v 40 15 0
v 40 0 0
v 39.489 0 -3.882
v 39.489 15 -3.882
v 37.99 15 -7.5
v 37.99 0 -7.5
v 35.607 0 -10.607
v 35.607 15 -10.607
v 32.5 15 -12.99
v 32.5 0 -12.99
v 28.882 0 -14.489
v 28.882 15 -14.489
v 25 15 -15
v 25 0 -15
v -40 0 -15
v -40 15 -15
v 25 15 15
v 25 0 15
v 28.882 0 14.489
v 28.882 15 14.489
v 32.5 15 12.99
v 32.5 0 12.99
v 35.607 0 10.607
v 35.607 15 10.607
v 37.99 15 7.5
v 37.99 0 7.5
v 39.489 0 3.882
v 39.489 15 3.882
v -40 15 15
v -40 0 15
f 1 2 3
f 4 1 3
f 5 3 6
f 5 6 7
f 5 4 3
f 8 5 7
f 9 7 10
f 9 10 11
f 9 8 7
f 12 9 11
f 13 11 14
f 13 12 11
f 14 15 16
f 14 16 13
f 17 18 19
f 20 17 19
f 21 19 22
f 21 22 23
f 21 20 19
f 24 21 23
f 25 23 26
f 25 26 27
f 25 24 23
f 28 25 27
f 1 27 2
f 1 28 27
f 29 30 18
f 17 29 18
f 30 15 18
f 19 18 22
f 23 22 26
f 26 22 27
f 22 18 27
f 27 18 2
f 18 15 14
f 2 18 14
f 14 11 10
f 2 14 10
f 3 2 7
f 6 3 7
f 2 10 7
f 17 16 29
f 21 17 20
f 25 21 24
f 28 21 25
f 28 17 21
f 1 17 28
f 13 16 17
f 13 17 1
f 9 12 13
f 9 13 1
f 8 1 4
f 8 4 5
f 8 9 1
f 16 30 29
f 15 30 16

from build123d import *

# Parameters (mm, degrees)
SKETCH2_W           = 80
SKETCH2_H           = 30
BOSS_EXTRUDE1_DEPTH = 15
CUT_EXTRUDE4_DEPTH  = 16
CUT_EXTRUDE5_DEPTH  = 16


with BuildPart() as part:
    # Sketch2 → Boss-Extrude1 (new body)
    with BuildSketch(Plane(origin=(0, 0, 0), x_dir=(1, 0, 0), z_dir=(0, 1, 0))):
        Rectangle(SKETCH2_W, SKETCH2_H)
    extrude(amount=BOSS_EXTRUDE1_DEPTH)

    # Sketch4 → Cut-Extrude4 (cut, through all)
    with BuildSketch(Plane(origin=(0, 15, 0), x_dir=(1, 0, 0), z_dir=(0, 1, 0))):
        with BuildLine():
            Line((25, 15), (40, 15))
            Line((40, 15), (40, 0))
            ThreePointArc((40, 0), (35.606601718, 10.606601718), (25, 15))
        make_face()
    extrude(amount=-CUT_EXTRUDE4_DEPTH, mode=Mode.SUBTRACT)

    # Sketch5 → Cut-Extrude5 (cut, through all)
    with BuildSketch(Plane(origin=(0, 15, 0), x_dir=(1, 0, 0), z_dir=(0, 1, 0))):
        with BuildLine():
            Line((40, 0), (40, -15))
            Line((40, -15), (25, -15))
            ThreePointArc((25, -15), (35.606601718, -10.606601718), (40, 0))
        make_face()
    extrude(amount=-CUT_EXTRUDE5_DEPTH, mode=Mode.SUBTRACT)


solid = part.part
